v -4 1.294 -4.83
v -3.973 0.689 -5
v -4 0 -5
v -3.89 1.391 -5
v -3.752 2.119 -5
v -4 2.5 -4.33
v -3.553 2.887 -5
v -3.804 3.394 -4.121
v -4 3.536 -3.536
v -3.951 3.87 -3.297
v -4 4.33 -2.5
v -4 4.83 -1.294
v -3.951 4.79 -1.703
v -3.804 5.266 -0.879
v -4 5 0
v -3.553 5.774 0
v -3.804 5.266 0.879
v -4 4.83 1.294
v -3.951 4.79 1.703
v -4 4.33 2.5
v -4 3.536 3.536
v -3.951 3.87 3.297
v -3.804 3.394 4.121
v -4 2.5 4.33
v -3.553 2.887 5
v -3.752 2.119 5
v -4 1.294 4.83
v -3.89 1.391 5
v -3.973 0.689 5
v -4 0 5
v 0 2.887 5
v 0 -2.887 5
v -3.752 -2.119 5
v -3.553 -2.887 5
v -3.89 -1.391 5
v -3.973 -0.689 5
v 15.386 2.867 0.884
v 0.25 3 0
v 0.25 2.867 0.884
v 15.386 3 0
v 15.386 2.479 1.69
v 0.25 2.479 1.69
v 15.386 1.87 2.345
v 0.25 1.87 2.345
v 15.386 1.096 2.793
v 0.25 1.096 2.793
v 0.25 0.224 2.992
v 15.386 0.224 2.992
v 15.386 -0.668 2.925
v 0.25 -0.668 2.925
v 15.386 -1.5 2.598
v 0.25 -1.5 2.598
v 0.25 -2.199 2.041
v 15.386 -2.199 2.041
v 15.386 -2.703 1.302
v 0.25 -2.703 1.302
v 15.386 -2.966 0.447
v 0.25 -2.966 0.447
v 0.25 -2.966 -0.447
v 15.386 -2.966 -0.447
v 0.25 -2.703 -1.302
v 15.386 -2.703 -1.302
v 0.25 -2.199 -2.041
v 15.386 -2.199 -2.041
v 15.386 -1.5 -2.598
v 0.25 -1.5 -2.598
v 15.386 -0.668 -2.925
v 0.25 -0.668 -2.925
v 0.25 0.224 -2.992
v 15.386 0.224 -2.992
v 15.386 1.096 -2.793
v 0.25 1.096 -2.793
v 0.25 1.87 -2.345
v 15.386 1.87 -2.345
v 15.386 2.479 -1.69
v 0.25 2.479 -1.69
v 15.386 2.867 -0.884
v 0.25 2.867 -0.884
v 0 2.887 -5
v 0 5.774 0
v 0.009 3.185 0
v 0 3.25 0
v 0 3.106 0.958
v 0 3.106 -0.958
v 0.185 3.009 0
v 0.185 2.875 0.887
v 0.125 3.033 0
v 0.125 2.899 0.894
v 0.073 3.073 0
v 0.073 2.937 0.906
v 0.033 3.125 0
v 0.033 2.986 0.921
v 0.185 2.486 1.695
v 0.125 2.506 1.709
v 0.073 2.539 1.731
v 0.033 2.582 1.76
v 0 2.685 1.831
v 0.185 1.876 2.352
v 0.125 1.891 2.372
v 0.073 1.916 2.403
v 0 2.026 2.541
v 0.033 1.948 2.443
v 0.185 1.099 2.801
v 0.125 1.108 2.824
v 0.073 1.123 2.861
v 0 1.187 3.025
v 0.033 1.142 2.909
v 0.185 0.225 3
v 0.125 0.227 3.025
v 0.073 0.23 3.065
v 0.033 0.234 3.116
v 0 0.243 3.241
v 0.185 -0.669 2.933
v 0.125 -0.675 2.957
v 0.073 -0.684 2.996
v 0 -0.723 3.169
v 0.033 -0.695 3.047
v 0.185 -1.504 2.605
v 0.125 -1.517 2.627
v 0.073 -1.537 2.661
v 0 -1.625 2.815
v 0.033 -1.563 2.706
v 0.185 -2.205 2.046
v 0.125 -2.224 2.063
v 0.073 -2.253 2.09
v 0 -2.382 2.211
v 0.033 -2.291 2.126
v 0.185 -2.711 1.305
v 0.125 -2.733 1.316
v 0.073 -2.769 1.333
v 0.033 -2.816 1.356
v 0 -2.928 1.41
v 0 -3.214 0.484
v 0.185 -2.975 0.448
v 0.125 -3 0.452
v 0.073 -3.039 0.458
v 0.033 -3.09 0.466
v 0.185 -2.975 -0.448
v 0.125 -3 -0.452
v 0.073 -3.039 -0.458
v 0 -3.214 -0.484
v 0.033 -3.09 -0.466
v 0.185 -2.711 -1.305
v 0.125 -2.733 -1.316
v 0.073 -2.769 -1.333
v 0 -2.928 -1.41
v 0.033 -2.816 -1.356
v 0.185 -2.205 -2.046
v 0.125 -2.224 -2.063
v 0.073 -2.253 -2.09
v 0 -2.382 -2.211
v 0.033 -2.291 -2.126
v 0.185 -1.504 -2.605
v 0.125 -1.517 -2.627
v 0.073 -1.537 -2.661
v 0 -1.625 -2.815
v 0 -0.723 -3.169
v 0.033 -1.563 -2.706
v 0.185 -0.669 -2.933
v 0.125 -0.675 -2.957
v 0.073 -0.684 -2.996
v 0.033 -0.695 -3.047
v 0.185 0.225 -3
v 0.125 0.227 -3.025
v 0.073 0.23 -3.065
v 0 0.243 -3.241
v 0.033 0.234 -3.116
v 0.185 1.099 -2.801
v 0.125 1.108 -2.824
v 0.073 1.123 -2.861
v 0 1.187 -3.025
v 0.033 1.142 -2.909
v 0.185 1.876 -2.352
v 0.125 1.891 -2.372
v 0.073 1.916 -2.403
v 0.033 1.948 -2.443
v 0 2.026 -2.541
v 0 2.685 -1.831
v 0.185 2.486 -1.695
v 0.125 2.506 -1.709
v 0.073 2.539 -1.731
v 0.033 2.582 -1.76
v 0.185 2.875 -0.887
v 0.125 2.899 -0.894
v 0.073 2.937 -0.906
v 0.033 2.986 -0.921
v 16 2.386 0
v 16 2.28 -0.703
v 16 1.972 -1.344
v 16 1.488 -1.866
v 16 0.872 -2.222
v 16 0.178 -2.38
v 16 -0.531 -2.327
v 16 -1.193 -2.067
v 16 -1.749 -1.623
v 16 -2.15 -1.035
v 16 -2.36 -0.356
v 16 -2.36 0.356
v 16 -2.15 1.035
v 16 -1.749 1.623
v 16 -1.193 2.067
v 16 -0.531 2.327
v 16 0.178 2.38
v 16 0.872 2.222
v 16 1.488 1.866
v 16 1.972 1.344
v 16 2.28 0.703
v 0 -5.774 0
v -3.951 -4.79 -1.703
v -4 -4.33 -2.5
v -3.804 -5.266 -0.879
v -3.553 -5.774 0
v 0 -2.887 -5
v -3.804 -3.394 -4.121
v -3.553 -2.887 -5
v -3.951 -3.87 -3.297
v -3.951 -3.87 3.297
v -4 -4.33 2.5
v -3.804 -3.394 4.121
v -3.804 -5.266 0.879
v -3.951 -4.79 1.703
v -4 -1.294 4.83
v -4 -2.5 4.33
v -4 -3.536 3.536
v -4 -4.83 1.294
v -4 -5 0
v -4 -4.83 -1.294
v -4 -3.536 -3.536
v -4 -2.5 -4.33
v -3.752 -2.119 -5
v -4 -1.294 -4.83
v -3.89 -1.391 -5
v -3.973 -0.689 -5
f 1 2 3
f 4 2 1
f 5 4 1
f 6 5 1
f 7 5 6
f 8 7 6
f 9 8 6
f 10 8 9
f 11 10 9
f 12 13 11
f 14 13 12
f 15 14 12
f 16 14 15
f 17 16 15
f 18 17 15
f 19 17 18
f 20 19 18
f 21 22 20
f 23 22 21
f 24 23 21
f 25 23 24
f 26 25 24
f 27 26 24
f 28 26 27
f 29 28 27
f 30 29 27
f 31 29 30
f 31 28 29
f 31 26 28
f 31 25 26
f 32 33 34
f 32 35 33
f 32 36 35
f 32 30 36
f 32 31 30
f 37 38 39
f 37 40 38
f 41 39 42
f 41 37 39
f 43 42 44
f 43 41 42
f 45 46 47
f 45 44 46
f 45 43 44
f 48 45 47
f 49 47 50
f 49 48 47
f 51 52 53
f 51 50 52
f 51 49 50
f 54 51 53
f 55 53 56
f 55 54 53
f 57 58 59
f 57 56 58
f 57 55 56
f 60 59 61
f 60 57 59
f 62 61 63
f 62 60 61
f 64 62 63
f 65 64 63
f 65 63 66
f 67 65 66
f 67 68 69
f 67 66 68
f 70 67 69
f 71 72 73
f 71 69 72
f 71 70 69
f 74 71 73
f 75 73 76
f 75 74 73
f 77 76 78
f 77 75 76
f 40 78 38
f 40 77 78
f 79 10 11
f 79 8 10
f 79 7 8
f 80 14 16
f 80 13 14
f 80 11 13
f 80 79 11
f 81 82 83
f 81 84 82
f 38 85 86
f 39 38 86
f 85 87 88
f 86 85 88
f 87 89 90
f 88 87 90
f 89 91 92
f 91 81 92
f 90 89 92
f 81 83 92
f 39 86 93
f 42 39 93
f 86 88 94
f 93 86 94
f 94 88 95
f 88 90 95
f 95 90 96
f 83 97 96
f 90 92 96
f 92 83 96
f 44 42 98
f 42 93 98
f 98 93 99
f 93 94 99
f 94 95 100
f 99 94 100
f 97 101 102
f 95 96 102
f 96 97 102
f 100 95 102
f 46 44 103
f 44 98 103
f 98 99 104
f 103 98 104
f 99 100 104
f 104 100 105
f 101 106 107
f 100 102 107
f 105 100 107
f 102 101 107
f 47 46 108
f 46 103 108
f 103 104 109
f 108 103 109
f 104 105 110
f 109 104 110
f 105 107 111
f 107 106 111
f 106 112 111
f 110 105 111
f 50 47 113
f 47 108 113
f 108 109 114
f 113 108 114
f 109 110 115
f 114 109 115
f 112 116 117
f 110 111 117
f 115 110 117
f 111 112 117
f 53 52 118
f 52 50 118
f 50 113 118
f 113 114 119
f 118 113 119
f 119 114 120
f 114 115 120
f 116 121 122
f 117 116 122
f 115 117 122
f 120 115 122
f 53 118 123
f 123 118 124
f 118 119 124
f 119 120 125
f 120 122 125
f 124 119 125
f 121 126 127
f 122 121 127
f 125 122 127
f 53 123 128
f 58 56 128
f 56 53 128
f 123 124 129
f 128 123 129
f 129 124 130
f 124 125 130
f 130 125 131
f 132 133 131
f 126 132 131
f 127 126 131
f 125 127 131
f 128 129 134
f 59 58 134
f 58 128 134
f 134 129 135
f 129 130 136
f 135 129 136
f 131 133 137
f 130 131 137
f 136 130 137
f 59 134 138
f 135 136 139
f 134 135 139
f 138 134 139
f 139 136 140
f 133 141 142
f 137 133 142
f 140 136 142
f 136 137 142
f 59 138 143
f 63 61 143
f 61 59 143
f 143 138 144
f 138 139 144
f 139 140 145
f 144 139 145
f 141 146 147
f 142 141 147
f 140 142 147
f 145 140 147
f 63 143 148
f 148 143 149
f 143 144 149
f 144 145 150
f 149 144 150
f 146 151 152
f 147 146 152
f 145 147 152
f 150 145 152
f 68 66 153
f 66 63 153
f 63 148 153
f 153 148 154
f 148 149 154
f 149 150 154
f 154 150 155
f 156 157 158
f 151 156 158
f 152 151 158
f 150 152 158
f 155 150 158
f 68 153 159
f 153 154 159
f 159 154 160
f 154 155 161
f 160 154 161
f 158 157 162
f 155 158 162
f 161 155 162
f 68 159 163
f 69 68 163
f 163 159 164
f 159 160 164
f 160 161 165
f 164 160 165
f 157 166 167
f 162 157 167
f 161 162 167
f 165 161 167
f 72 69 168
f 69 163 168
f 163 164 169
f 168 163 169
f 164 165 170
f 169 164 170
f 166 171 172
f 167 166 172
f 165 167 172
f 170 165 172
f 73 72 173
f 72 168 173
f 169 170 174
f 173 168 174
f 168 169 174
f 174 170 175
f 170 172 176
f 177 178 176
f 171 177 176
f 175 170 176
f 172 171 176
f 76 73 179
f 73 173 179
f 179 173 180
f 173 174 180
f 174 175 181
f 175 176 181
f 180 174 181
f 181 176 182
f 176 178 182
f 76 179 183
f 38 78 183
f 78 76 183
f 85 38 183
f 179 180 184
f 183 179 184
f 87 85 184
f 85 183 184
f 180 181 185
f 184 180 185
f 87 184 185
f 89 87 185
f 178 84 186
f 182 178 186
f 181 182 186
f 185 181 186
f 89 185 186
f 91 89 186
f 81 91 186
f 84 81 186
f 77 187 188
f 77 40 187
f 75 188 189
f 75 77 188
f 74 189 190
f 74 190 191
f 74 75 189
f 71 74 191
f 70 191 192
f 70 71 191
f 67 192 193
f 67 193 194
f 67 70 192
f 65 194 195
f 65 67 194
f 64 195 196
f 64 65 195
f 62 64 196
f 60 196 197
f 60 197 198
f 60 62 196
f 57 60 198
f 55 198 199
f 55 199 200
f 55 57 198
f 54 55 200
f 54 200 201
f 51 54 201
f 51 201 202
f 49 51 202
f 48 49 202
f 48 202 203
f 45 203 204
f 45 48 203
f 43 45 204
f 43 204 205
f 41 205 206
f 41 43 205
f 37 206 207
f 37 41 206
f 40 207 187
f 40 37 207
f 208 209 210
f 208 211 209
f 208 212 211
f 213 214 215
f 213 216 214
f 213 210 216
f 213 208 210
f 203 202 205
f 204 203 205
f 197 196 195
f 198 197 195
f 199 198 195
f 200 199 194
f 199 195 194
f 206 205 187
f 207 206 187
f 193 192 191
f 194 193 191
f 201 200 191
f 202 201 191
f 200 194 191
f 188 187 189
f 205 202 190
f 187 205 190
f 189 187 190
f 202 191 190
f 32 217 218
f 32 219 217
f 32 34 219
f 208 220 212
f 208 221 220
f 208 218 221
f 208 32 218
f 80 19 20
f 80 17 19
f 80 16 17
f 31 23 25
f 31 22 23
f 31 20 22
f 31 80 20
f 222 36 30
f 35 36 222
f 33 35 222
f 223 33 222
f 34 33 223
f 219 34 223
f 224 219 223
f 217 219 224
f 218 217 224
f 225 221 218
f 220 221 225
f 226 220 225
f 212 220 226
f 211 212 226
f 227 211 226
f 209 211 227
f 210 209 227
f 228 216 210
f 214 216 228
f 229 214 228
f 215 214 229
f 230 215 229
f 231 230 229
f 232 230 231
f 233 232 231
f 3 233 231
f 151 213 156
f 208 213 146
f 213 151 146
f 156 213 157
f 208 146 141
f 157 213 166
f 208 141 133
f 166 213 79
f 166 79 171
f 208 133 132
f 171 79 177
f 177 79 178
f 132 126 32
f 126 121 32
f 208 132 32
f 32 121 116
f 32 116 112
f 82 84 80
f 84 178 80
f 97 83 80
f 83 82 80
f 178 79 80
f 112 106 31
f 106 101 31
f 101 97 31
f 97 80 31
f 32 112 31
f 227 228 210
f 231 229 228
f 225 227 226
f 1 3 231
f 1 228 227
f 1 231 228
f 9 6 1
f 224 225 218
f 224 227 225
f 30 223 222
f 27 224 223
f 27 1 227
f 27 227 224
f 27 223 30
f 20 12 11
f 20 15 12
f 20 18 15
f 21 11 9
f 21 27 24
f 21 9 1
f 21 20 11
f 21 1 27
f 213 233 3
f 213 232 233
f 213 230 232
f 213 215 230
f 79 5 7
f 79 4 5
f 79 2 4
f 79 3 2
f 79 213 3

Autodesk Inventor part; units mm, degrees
ref_plane "YZ Plane" through (0, 0, 0) normal (1, 0, 0) x (0, 1, 0)
ref_plane "XZ Plane" through (0, 0, 0) normal (0, 1, 0) x (-1, 0, 0)
sketch "Sketch1" plane through (0, 0, 0) normal (0, 0, 1) x (1, 0, 0)
  line L0 (0, 3) -> (16, 3)
  line L1 (16, 3) -> (16, 0)
  line L2 (16, 0) -> (0, 0)
  line L3 (-3.2, 0) -> (19.2, 0) projected
  line L4 (0, -0.6) -> (0, 3.6) projected
  line L5 (0, 3) -> (0, 0)
  dimension "d2" = 6
  dimension "d59" = 16
revolve "Body" add sketch "Sketch1" angle 360 about axis through (16, 0, 0) along (-1, 0, 0)
sketch "Sketch2" plane through (0, 0, 0) normal (-1, 0, 0) x (0, 0, 1)
  line L0 (0, 5.7735) -> (5, 2.8868)
  line L1 (5, 2.8868) -> (5, -2.8868)
  line L2 (5, -2.8868) -> (0, -5.7735)
  line L3 (0, -5.7735) -> (-5, -2.8868)
  line L4 (-5, -2.8868) -> (-5, 2.8868)
  line L5 (-5, 2.8868) -> (0, 5.7735)
  line L6 (-7, 0) -> (7, 0) projected
  line L7 (0, 8.0829) -> (0, -8.0829) projected
  point P0 (0, 0)
  point P1 (0, 0)
  dimension "d11" = 10
extrude "Head" add sketch "Sketch2" along normal blind 4
sketch "Sketch4" plane through (0, 0, 0) normal (0, 0, 1) x (1, 0, 0)
  line L0 (-3.4226, 6) -> (-4, 5)
  line L1 (-1.1, 0) -> (-0.234, 0)
  line L2 (-4.7532, 0) -> (0.5192, 0) projected
  line L3 (-4, 6) -> (-3.4226, 6)
  line L4 (-4, 5) -> (-4, 6)
  line L5 (0, 7.2) -> (0, -1.2) projected
  dimension "d65" = 10
  dimension "d67" = 30
  dimension "d68" = 12
  dimension "d69" = 4
revolve "Chamfer1" cut sketch "Sketch4" angle 360 about axis through (-1.1, 0, 0) along (1, 0, 0)
thread "Thread" size "M6x1" designation "M6" class "6g" standard "GB Metric profile" length 15
chamfer "Chamfer2" distance 0.6135 distance2 0.6136 1 edges at (16, -3, 0) measured on face at (16, -0.5681, 0.823)
fillet "Fillet2" radius 0.25 1 edges at (0, -3, 0)
ref_plane "Work Plane1" through (1.525, 0, 0) normal (0, 0, 1) x (1, 0, 0)
equation "\"d2\" = GD"
equation "\"d59\" = NLG"
equation "\"d11\" = SW"
equation "\"d3\" = KOH"
equation "\"d71\" = RR"
equation "\"d15\" = GEL"
equation "\"d6\" = -0.5 * SPD + 0.5 * GD"
equation "\"d65\" = SW"
equation "\"d67\" = ANG1"
equation "\"d68\" = 1.2 * SW"
equation "\"d69\" = KOH"
equation "\"NLG\" = 16"
equation "\"GD\" = NND"
equation "\"BDM\" = NND"
equation "\"KOH\" = 4"
equation "\"GEL\" = 15"
equation "\"SW\" = 10"
equation "\"SPD\" = NND - 1.2269 * PTC"
equation "\"SD2\" = NND"
equation "\"SD\" = 0"
equation "\"ANG1\" = 30deg"
equation "\"GAL\" = 0.61345 * PTC"
equation "\"GUL\" = 0.61345 * PTC"
equation "\"RR\" = 0.25"
equation "\"RR1\" = 0.1"
equation "\"WFT\" = 0"
equation "\"GD1\" = THREADDIA - 1.2269 * PTC"
equation "\"THREADDIA\" = 6"
equation "\"TOA\" = 30deg"
equation "\"FAWI\" = 90deg"
equation "\"PTC\" = 1"
equation "\"NND\" = 6"
equation "\"E0\" = 1.155 * SW"
properties part number "Hexagon bolt GB/T 5781 M6 x 16" material "Steel, Mild"
